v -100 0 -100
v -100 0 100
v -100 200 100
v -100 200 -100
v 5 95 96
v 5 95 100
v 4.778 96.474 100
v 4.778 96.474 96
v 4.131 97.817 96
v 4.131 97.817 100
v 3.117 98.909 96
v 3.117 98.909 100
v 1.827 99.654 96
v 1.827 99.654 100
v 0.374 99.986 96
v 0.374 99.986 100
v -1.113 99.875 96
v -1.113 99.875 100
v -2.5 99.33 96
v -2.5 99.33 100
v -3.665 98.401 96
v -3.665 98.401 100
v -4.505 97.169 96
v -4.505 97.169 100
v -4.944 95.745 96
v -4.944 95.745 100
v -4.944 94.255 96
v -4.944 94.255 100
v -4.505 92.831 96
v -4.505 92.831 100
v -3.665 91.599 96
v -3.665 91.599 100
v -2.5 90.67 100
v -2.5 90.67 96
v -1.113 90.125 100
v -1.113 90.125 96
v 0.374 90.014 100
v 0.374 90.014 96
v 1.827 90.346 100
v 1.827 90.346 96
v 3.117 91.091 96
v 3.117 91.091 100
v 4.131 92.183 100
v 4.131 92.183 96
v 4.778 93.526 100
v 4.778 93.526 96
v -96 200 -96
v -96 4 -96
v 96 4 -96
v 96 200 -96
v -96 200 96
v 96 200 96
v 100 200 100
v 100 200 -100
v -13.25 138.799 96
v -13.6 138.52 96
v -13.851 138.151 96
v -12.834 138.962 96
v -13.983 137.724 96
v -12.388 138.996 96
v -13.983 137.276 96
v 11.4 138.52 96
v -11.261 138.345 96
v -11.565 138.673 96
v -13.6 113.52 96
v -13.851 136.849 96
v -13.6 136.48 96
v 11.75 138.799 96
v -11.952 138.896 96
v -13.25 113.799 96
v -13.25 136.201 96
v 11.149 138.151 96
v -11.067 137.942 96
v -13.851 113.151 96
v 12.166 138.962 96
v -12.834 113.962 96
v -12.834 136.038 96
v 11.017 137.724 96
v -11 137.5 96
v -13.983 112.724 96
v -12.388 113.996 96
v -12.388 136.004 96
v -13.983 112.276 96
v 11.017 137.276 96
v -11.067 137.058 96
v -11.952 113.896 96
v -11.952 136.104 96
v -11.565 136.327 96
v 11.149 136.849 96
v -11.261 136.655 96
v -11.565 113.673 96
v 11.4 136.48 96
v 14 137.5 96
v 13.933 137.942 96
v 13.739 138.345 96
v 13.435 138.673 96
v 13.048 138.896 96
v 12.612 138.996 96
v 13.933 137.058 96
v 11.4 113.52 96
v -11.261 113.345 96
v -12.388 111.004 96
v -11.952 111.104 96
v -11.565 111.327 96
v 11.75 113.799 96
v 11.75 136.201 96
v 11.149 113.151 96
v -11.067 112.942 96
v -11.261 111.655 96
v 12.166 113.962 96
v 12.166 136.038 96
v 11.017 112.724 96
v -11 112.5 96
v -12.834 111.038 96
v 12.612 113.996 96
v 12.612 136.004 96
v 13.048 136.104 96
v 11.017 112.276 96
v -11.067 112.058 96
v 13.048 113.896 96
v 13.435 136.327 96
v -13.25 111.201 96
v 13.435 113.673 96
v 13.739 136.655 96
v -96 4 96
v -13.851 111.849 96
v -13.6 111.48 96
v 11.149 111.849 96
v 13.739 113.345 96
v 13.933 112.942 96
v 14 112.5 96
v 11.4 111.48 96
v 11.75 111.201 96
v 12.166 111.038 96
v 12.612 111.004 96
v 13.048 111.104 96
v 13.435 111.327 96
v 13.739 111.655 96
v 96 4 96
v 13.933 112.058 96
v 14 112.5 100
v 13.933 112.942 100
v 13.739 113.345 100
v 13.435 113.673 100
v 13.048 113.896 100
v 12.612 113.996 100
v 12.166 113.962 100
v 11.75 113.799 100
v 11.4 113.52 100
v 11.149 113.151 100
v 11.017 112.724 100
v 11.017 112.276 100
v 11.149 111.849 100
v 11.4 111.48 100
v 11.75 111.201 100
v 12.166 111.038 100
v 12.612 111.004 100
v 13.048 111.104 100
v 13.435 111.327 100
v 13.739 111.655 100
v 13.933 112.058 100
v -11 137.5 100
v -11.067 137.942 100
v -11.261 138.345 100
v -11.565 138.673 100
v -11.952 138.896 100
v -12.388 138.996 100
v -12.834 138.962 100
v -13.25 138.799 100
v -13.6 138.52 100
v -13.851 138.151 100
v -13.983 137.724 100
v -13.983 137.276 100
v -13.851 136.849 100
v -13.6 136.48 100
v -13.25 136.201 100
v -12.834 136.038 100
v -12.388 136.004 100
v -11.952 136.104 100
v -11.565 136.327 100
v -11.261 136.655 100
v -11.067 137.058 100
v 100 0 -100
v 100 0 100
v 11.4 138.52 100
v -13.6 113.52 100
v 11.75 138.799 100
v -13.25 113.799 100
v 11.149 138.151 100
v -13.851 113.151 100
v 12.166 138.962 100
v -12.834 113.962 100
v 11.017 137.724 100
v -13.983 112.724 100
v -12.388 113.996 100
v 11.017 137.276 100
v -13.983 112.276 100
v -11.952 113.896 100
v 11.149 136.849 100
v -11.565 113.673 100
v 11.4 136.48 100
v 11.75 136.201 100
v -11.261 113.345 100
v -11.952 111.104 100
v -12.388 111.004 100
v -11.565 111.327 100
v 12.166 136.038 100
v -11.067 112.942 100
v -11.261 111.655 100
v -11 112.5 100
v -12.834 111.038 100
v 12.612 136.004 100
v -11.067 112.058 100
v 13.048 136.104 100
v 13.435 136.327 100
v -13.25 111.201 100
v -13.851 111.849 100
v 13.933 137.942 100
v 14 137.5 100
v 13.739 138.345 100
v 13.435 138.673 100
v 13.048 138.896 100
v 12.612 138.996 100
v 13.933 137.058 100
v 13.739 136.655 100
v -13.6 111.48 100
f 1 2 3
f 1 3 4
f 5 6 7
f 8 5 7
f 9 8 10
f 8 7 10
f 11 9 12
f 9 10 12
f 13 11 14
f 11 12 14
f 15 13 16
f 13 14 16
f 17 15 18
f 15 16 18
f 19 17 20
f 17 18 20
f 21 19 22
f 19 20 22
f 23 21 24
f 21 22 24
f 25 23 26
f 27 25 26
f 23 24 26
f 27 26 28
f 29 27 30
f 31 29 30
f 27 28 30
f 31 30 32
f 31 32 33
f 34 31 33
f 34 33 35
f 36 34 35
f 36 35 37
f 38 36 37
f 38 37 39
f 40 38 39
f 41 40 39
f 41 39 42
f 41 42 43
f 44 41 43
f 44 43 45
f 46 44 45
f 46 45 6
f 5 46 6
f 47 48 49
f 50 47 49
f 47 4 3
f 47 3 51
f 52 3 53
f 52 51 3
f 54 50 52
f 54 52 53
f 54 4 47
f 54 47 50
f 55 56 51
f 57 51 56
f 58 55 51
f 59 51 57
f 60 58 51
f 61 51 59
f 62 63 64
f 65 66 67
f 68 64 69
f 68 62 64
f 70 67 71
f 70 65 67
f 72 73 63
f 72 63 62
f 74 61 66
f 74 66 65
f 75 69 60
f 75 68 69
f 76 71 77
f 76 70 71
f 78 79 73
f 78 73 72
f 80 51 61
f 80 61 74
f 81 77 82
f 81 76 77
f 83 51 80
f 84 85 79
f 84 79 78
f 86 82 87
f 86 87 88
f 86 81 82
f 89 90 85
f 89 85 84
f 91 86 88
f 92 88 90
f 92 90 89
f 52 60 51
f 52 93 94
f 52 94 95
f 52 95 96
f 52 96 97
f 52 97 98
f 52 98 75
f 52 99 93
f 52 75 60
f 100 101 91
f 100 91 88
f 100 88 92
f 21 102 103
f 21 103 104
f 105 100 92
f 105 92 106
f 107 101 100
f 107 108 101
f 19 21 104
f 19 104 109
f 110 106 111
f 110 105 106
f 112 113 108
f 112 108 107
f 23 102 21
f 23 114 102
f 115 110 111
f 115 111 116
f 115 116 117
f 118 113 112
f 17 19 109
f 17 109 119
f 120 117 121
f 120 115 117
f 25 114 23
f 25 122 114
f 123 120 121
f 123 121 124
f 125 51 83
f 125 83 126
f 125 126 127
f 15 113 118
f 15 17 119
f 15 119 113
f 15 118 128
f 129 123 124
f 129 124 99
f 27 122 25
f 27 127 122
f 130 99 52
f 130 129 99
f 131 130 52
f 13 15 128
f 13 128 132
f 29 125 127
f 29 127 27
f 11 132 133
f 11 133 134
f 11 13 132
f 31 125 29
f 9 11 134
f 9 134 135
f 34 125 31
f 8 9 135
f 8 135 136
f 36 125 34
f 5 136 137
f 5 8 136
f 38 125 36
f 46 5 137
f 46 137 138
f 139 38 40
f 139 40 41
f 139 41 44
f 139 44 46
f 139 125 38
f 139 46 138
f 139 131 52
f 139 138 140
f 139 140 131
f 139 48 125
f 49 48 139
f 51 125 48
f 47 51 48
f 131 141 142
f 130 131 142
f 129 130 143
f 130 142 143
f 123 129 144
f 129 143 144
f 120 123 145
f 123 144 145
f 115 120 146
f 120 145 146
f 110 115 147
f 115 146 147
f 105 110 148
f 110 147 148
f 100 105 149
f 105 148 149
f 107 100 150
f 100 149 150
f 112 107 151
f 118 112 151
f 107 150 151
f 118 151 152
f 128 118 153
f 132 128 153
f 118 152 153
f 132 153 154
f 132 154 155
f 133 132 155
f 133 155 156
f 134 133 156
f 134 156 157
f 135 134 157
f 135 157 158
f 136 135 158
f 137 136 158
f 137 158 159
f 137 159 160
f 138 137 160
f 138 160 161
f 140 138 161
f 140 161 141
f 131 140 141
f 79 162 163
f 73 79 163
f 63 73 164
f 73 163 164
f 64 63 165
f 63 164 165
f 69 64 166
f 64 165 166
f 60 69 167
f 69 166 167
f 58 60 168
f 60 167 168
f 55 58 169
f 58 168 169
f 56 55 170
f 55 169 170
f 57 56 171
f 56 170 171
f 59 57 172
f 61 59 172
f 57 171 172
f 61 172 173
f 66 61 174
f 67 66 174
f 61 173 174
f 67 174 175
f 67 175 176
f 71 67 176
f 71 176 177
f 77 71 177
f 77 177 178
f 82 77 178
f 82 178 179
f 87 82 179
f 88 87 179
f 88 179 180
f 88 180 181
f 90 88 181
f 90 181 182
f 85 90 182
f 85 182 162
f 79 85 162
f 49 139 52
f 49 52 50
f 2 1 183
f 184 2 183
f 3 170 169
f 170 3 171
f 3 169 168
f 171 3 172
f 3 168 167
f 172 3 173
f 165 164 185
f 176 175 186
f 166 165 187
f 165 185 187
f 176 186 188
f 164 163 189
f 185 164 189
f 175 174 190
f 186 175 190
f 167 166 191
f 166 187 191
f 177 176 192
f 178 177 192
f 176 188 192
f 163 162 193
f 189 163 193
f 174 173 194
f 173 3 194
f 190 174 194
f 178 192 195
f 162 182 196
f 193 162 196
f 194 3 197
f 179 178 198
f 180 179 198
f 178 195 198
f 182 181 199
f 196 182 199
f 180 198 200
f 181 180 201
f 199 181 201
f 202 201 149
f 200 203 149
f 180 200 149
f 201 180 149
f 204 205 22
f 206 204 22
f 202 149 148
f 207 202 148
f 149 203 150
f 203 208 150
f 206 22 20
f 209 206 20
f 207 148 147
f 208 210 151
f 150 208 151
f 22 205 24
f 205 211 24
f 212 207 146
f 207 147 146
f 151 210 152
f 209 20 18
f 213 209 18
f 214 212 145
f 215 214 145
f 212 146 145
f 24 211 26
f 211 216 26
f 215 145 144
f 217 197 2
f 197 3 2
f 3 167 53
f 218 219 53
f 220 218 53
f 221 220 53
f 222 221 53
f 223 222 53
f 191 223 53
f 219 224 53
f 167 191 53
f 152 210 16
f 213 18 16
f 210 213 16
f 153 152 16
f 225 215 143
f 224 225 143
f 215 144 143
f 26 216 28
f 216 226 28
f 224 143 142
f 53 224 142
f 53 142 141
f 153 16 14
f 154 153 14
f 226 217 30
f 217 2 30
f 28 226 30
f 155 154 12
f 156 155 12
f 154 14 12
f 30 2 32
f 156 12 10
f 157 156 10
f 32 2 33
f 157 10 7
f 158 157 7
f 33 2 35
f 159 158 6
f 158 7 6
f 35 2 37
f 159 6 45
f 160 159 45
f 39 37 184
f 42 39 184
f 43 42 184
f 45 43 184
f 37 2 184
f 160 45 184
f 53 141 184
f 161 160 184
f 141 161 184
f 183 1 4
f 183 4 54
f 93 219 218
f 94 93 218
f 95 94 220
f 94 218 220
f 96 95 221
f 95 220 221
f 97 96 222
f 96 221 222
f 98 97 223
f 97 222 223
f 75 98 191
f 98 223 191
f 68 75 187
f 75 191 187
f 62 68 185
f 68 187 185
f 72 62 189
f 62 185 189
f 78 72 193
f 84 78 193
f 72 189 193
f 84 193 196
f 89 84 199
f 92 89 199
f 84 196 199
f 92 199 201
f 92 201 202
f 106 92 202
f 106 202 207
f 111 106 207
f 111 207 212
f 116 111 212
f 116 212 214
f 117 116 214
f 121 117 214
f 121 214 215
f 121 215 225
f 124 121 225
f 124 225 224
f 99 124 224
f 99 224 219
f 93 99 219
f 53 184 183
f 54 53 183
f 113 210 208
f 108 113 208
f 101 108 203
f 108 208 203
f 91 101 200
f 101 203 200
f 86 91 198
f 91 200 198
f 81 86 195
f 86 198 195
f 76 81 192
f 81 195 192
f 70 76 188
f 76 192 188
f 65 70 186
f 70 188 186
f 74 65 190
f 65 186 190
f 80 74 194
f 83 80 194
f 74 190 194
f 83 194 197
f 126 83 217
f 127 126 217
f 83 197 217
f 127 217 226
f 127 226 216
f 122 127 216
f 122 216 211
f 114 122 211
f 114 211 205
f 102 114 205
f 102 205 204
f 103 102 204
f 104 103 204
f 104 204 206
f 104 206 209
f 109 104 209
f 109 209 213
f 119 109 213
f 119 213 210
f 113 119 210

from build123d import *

# Parameters (mm, degrees)
SKETCH1_W           = 200
SKETCH1_H           = 200
BOSS_EXTRUDE1_DEPTH = 200
SHELL1_T            = -4
CUT_EXTRUDE1_REACH  = 302
SKETCH2_R           = 1.5
SKETCH2_R_2         = 5


with BuildPart() as part:
    # Sketch1 → Boss-Extrude1 (new body)
    with BuildSketch(Plane(origin=(0, 0, 0), x_dir=(1, 0, 0), z_dir=(0, 1, 0))):
        Rectangle(SKETCH1_W, SKETCH1_H)
    extrude(amount=BOSS_EXTRUDE1_DEPTH)

    # Shell1
    shell1_openings = [part.faces().sort_by_distance(p)[0] for p in [
        (0, 200, 0),
    ]]
    offset(amount=SHELL1_T, openings=shell1_openings, kind=Kind.INTERSECTION)

    # Sketch2 → Cut-Extrude1 (cut, up to next)
    with BuildSketch(Plane.XY.offset(100), mode=Mode.PRIVATE) as cut_extrude1_sk1:
        with Locations((-12.5, 137.5)):
            Circle(SKETCH2_R)
    cut_extrude1_tool1 = extrude(cut_extrude1_sk1.sketch, amount=-CUT_EXTRUDE1_REACH, mode=Mode.PRIVATE) & part.part
    # Sketch2 → Cut-Extrude1 (cut, up to next)
    with BuildSketch(Plane.XY.offset(100), mode=Mode.PRIVATE) as cut_extrude1_sk2:
        with Locations((12.5, 137.5)):
            Circle(SKETCH2_R)
    cut_extrude1_tool2 = extrude(cut_extrude1_sk2.sketch, amount=-CUT_EXTRUDE1_REACH, mode=Mode.PRIVATE) & part.part
    # Sketch2 → Cut-Extrude1 (cut, up to next)
    with BuildSketch(Plane.XY.offset(100), mode=Mode.PRIVATE) as cut_extrude1_sk3:
        with Locations((12.5, 112.5)):
            Circle(SKETCH2_R)
    cut_extrude1_tool3 = extrude(cut_extrude1_sk3.sketch, amount=-CUT_EXTRUDE1_REACH, mode=Mode.PRIVATE) & part.part
    # Sketch2 → Cut-Extrude1 (cut, up to next)
    with BuildSketch(Plane.XY.offset(100), mode=Mode.PRIVATE) as cut_extrude1_sk4:
        with Locations((-12.5, 112.5)):
            Circle(SKETCH2_R)
    cut_extrude1_tool4 = extrude(cut_extrude1_sk4.sketch, amount=-CUT_EXTRUDE1_REACH, mode=Mode.PRIVATE) & part.part
    # Sketch2 → Cut-Extrude1 (cut, up to next)
    with BuildSketch(Plane.XY.offset(100), mode=Mode.PRIVATE) as cut_extrude1_sk5:
        with Locations((0, 95)):
            Circle(SKETCH2_R_2)
    cut_extrude1_tool5 = extrude(cut_extrude1_sk5.sketch, amount=-CUT_EXTRUDE1_REACH, mode=Mode.PRIVATE) & part.part
    add(cut_extrude1_tool1.solids().sort_by_distance((-12.5, 137.5, 100))[0], mode=Mode.SUBTRACT)
    add(cut_extrude1_tool2.solids().sort_by_distance((12.5, 137.5, 100))[0], mode=Mode.SUBTRACT)
    add(cut_extrude1_tool3.solids().sort_by_distance((12.5, 112.5, 100))[0], mode=Mode.SUBTRACT)
    add(cut_extrude1_tool4.solids().sort_by_distance((-12.5, 112.5, 100))[0], mode=Mode.SUBTRACT)
    add(cut_extrude1_tool5.solids().sort_by_distance((0, 95, 100))[0], mode=Mode.SUBTRACT)


solid = part.part
